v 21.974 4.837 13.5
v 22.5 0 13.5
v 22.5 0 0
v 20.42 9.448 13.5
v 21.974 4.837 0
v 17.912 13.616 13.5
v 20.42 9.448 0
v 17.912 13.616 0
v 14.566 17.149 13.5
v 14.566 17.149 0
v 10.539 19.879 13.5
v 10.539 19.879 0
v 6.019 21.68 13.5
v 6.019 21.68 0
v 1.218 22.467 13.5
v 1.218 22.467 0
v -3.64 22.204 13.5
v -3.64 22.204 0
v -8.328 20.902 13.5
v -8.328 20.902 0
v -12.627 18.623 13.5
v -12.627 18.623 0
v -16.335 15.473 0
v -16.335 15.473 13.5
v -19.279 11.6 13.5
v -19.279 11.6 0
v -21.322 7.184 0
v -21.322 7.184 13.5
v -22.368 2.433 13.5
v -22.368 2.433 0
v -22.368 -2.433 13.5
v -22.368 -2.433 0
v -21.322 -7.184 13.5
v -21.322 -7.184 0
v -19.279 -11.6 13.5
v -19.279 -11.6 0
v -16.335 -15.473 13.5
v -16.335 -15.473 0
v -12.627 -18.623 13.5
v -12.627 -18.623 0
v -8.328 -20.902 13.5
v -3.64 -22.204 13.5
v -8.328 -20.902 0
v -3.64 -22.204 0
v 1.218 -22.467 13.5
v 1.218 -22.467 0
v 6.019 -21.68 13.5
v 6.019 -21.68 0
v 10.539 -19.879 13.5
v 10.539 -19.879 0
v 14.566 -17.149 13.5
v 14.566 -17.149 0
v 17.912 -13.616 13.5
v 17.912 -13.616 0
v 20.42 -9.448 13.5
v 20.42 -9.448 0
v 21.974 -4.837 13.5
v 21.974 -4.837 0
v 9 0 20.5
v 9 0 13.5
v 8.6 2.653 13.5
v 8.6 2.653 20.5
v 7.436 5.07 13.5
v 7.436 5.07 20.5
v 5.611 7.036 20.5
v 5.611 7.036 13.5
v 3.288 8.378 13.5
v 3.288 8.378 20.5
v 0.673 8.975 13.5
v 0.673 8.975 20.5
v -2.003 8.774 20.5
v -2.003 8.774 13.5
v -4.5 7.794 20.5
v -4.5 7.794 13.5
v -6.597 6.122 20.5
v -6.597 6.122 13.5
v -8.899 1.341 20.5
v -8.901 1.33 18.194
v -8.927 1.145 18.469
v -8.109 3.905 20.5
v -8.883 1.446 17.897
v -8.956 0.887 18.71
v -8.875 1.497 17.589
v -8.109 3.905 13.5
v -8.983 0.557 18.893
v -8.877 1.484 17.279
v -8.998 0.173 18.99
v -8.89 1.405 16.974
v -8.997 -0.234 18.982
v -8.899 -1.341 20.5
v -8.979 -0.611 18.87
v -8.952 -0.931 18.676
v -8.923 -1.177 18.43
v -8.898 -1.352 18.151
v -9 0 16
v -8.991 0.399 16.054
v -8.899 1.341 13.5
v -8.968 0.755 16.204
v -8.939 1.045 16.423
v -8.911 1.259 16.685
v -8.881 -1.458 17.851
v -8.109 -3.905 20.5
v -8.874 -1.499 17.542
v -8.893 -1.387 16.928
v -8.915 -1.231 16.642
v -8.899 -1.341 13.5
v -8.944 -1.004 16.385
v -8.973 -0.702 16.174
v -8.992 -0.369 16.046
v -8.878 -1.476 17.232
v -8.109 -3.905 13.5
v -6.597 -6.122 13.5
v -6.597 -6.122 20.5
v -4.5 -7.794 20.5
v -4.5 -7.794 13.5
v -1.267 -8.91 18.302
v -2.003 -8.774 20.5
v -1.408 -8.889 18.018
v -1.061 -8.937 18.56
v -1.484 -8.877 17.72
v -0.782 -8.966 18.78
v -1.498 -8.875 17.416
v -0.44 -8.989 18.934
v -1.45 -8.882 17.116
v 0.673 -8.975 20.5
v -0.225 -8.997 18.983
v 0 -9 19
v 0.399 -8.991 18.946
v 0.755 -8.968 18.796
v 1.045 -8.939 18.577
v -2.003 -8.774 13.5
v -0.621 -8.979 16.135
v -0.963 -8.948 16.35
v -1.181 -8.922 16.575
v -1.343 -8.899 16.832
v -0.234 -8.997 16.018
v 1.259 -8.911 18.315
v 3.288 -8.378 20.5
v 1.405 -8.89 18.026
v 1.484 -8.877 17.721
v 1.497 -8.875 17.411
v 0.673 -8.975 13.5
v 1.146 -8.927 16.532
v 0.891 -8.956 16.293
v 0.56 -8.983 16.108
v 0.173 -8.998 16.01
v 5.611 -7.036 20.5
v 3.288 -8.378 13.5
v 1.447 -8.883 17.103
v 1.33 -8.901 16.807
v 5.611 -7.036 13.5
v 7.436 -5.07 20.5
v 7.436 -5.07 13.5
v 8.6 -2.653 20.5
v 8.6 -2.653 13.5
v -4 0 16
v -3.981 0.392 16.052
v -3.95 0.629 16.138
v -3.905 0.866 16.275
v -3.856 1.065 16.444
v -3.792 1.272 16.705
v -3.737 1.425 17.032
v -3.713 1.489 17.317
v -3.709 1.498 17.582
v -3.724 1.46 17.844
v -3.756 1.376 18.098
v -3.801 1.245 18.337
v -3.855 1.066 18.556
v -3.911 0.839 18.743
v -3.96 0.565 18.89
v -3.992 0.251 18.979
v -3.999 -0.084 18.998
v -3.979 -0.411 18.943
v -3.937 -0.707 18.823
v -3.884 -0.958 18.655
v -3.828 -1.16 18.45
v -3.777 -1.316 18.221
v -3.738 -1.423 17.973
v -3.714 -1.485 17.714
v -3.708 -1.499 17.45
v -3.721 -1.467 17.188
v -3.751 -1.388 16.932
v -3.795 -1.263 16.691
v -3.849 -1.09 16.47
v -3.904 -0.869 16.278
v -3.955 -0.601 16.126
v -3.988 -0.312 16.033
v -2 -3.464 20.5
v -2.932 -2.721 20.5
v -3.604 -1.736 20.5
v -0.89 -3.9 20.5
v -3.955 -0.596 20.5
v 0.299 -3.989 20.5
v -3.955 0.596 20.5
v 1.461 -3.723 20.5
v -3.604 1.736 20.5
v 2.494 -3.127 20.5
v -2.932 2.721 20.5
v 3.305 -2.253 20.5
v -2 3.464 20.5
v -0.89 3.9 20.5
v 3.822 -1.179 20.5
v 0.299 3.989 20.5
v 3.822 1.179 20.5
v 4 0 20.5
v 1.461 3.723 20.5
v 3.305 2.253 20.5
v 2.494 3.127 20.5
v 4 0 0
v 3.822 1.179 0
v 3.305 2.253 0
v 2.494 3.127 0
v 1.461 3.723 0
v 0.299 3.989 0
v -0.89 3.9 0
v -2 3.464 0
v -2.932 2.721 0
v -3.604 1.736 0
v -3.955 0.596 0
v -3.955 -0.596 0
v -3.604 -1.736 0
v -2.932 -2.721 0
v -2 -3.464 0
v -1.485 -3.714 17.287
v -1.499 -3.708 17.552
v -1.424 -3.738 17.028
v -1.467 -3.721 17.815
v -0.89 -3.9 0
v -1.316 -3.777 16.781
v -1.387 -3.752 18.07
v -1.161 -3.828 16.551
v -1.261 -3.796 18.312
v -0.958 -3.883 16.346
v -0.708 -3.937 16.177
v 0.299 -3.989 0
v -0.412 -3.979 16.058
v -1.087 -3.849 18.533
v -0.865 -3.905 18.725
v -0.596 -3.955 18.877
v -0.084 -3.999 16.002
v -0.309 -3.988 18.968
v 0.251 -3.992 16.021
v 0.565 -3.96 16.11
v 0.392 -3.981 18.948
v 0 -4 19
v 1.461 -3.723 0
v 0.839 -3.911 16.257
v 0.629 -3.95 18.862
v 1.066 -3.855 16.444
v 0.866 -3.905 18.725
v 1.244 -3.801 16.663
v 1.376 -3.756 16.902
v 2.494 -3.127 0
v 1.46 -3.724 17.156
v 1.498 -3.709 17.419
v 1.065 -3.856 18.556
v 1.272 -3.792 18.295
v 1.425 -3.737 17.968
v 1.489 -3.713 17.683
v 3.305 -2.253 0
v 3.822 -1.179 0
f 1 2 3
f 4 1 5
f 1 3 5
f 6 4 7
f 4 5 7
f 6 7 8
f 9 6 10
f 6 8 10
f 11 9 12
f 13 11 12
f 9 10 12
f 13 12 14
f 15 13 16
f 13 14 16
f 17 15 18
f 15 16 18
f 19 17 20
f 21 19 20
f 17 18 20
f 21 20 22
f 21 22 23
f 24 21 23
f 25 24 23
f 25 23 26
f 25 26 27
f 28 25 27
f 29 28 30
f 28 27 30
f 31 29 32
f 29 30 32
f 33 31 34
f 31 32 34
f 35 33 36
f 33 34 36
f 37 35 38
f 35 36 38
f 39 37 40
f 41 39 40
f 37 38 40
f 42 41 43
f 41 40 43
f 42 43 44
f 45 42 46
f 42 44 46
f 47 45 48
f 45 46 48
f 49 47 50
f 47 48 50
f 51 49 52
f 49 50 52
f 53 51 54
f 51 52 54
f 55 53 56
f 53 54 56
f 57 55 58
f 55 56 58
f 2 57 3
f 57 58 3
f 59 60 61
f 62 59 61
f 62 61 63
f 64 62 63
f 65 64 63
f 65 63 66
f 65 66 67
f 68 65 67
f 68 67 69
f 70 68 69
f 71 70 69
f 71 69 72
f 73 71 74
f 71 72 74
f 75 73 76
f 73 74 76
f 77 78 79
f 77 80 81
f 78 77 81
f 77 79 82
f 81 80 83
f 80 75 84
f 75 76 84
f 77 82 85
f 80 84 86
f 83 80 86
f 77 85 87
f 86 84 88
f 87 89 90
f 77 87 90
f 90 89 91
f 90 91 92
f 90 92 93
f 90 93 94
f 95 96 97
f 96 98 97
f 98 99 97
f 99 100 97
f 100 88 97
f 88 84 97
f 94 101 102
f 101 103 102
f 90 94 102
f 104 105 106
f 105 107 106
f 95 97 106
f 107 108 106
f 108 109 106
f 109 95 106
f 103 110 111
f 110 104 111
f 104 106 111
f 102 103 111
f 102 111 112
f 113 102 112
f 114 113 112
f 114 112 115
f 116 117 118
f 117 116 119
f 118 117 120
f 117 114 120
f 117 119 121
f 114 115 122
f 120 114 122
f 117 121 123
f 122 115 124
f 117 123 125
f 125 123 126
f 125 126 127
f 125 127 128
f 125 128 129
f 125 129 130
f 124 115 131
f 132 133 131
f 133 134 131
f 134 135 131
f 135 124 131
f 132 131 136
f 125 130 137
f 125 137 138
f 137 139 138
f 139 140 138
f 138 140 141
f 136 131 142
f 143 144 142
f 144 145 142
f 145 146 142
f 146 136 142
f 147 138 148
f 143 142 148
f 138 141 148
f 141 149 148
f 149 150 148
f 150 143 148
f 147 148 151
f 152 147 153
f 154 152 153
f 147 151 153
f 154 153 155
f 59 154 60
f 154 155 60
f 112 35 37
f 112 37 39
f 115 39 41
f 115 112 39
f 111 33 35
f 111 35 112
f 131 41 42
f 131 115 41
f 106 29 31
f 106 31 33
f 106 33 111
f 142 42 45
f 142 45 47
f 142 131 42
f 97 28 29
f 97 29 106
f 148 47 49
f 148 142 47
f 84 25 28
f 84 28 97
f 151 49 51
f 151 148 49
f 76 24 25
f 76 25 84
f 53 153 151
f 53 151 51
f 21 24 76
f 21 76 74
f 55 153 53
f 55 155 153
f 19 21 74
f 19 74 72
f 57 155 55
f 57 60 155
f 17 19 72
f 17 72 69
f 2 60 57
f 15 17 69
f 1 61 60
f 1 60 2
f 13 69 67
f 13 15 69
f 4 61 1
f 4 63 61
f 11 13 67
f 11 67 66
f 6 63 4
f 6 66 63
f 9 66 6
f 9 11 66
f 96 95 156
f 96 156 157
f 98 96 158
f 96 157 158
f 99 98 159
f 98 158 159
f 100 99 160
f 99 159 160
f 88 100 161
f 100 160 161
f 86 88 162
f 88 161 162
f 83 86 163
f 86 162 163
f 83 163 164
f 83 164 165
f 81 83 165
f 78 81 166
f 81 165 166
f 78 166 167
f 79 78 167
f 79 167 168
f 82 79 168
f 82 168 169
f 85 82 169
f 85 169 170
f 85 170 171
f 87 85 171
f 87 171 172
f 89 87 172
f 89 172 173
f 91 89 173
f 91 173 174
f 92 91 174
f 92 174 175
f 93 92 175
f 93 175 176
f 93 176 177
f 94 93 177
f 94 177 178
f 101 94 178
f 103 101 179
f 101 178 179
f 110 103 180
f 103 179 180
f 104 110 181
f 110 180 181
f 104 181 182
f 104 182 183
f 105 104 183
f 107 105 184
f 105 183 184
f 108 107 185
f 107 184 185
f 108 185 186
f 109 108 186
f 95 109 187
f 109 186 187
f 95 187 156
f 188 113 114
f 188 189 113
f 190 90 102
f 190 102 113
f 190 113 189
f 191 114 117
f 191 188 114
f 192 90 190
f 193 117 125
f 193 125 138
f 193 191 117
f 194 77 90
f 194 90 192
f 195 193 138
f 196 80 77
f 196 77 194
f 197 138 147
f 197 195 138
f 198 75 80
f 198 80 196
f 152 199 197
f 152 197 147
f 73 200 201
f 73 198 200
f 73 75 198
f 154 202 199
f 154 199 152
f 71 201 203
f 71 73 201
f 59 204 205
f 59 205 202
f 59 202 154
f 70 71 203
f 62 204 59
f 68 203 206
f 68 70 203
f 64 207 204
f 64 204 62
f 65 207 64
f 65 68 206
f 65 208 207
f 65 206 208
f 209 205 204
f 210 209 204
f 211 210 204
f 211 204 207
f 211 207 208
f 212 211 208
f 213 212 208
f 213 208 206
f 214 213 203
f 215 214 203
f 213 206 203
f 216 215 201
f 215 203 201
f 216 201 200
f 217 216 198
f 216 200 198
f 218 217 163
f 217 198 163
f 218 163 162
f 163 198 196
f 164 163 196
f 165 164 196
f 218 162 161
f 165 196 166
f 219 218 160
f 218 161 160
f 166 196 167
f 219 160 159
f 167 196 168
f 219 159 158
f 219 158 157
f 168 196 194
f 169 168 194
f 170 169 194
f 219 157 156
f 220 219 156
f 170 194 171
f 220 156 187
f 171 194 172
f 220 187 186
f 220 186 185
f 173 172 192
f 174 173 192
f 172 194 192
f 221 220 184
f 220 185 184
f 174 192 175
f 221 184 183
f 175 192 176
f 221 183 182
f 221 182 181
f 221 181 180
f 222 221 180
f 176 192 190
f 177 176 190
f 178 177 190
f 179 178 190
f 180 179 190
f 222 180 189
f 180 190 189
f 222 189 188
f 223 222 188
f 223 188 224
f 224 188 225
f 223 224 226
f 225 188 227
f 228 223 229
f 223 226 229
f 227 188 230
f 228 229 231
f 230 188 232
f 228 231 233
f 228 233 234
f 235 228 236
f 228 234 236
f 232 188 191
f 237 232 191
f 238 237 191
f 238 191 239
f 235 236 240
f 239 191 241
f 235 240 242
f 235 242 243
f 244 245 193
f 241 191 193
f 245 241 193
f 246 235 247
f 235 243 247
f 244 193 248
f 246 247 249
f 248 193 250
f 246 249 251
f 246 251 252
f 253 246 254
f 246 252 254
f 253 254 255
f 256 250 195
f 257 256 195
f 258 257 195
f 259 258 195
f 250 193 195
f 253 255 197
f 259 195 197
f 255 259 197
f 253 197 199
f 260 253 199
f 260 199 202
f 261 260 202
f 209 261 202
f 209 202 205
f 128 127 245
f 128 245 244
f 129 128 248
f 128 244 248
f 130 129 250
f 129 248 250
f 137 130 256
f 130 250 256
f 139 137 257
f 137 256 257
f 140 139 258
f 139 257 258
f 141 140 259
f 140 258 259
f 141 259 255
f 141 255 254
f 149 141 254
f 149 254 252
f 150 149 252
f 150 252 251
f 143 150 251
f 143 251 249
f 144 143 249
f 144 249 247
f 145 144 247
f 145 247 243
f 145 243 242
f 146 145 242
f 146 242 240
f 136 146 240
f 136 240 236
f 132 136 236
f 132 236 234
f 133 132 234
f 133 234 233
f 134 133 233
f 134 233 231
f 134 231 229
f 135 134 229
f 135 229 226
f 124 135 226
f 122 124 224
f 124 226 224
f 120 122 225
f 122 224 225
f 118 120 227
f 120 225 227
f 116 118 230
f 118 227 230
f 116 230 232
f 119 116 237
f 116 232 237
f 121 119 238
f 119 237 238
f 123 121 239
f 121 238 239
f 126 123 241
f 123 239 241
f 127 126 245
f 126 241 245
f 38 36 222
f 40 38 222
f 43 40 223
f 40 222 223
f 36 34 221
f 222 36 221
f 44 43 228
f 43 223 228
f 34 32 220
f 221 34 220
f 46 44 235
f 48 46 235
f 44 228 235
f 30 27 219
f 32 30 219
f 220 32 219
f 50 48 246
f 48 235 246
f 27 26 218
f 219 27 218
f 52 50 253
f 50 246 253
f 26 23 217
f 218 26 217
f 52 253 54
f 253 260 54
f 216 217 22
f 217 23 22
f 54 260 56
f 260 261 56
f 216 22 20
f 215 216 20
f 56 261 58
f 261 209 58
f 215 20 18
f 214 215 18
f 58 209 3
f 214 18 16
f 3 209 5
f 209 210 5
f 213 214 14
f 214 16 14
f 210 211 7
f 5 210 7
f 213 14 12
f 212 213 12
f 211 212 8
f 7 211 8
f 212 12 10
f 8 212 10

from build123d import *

# Parameters (mm, degrees)
SKETCH_1_R          = 22.5
EXTRUDE_1_DEPTH     = 13.5
SKETCH_2_R          = 9
EXTRUDE_2_DEPTH     = 7
SKETCH_3_R          = 4
CUT_EXTRUDE_1_DEPTH = 38.851684243
SKETCH_4_R          = 1.5
CUT_EXTRUDE_2_DEPTH = 38.851684243
SKETCH_5_R          = 1.5
CUT_EXTRUDE_3_DEPTH = 38.851684297


with BuildPart() as part:
    # 스케치1 → 보스-돌출1 (new body)
    with BuildSketch(Plane.XY):
        Circle(SKETCH_1_R)
    extrude(amount=EXTRUDE_1_DEPTH)

    # 스케치2 → 보스-돌출2 (add)
    with BuildSketch(Plane.XY.offset(13.5)):
        Circle(SKETCH_2_R)
    extrude(amount=EXTRUDE_2_DEPTH)

    # 스케치3 → 컷-돌출1 (cut, through all)
    with BuildSketch(Plane.XY.offset(20.5)):
        Circle(SKETCH_3_R)
    extrude(amount=-CUT_EXTRUDE_1_DEPTH, mode=Mode.SUBTRACT)

    # 스케치4 → 컷-돌출2 (cut, through all)
    with BuildSketch(Plane(origin=(0, 0, 0), x_dir=(1, 0, 0), z_dir=(0, 1, 0))):
        with Locations(Location((0, -17.5, 0), (0, 0, 270))):
            Circle(SKETCH_4_R)
    extrude(amount=-CUT_EXTRUDE_2_DEPTH, mode=Mode.SUBTRACT)

    # 스케치5 → 컷-돌출3 (cut, through all)
    with BuildSketch(Plane(origin=(0, 0, 0), x_dir=(0, 0, -1), z_dir=(1, 0, 0))):
        with Locations((-17.5, 0)):
            Circle(SKETCH_5_R)
    extrude(amount=-CUT_EXTRUDE_3_DEPTH, mode=Mode.SUBTRACT)


solid = part.part
